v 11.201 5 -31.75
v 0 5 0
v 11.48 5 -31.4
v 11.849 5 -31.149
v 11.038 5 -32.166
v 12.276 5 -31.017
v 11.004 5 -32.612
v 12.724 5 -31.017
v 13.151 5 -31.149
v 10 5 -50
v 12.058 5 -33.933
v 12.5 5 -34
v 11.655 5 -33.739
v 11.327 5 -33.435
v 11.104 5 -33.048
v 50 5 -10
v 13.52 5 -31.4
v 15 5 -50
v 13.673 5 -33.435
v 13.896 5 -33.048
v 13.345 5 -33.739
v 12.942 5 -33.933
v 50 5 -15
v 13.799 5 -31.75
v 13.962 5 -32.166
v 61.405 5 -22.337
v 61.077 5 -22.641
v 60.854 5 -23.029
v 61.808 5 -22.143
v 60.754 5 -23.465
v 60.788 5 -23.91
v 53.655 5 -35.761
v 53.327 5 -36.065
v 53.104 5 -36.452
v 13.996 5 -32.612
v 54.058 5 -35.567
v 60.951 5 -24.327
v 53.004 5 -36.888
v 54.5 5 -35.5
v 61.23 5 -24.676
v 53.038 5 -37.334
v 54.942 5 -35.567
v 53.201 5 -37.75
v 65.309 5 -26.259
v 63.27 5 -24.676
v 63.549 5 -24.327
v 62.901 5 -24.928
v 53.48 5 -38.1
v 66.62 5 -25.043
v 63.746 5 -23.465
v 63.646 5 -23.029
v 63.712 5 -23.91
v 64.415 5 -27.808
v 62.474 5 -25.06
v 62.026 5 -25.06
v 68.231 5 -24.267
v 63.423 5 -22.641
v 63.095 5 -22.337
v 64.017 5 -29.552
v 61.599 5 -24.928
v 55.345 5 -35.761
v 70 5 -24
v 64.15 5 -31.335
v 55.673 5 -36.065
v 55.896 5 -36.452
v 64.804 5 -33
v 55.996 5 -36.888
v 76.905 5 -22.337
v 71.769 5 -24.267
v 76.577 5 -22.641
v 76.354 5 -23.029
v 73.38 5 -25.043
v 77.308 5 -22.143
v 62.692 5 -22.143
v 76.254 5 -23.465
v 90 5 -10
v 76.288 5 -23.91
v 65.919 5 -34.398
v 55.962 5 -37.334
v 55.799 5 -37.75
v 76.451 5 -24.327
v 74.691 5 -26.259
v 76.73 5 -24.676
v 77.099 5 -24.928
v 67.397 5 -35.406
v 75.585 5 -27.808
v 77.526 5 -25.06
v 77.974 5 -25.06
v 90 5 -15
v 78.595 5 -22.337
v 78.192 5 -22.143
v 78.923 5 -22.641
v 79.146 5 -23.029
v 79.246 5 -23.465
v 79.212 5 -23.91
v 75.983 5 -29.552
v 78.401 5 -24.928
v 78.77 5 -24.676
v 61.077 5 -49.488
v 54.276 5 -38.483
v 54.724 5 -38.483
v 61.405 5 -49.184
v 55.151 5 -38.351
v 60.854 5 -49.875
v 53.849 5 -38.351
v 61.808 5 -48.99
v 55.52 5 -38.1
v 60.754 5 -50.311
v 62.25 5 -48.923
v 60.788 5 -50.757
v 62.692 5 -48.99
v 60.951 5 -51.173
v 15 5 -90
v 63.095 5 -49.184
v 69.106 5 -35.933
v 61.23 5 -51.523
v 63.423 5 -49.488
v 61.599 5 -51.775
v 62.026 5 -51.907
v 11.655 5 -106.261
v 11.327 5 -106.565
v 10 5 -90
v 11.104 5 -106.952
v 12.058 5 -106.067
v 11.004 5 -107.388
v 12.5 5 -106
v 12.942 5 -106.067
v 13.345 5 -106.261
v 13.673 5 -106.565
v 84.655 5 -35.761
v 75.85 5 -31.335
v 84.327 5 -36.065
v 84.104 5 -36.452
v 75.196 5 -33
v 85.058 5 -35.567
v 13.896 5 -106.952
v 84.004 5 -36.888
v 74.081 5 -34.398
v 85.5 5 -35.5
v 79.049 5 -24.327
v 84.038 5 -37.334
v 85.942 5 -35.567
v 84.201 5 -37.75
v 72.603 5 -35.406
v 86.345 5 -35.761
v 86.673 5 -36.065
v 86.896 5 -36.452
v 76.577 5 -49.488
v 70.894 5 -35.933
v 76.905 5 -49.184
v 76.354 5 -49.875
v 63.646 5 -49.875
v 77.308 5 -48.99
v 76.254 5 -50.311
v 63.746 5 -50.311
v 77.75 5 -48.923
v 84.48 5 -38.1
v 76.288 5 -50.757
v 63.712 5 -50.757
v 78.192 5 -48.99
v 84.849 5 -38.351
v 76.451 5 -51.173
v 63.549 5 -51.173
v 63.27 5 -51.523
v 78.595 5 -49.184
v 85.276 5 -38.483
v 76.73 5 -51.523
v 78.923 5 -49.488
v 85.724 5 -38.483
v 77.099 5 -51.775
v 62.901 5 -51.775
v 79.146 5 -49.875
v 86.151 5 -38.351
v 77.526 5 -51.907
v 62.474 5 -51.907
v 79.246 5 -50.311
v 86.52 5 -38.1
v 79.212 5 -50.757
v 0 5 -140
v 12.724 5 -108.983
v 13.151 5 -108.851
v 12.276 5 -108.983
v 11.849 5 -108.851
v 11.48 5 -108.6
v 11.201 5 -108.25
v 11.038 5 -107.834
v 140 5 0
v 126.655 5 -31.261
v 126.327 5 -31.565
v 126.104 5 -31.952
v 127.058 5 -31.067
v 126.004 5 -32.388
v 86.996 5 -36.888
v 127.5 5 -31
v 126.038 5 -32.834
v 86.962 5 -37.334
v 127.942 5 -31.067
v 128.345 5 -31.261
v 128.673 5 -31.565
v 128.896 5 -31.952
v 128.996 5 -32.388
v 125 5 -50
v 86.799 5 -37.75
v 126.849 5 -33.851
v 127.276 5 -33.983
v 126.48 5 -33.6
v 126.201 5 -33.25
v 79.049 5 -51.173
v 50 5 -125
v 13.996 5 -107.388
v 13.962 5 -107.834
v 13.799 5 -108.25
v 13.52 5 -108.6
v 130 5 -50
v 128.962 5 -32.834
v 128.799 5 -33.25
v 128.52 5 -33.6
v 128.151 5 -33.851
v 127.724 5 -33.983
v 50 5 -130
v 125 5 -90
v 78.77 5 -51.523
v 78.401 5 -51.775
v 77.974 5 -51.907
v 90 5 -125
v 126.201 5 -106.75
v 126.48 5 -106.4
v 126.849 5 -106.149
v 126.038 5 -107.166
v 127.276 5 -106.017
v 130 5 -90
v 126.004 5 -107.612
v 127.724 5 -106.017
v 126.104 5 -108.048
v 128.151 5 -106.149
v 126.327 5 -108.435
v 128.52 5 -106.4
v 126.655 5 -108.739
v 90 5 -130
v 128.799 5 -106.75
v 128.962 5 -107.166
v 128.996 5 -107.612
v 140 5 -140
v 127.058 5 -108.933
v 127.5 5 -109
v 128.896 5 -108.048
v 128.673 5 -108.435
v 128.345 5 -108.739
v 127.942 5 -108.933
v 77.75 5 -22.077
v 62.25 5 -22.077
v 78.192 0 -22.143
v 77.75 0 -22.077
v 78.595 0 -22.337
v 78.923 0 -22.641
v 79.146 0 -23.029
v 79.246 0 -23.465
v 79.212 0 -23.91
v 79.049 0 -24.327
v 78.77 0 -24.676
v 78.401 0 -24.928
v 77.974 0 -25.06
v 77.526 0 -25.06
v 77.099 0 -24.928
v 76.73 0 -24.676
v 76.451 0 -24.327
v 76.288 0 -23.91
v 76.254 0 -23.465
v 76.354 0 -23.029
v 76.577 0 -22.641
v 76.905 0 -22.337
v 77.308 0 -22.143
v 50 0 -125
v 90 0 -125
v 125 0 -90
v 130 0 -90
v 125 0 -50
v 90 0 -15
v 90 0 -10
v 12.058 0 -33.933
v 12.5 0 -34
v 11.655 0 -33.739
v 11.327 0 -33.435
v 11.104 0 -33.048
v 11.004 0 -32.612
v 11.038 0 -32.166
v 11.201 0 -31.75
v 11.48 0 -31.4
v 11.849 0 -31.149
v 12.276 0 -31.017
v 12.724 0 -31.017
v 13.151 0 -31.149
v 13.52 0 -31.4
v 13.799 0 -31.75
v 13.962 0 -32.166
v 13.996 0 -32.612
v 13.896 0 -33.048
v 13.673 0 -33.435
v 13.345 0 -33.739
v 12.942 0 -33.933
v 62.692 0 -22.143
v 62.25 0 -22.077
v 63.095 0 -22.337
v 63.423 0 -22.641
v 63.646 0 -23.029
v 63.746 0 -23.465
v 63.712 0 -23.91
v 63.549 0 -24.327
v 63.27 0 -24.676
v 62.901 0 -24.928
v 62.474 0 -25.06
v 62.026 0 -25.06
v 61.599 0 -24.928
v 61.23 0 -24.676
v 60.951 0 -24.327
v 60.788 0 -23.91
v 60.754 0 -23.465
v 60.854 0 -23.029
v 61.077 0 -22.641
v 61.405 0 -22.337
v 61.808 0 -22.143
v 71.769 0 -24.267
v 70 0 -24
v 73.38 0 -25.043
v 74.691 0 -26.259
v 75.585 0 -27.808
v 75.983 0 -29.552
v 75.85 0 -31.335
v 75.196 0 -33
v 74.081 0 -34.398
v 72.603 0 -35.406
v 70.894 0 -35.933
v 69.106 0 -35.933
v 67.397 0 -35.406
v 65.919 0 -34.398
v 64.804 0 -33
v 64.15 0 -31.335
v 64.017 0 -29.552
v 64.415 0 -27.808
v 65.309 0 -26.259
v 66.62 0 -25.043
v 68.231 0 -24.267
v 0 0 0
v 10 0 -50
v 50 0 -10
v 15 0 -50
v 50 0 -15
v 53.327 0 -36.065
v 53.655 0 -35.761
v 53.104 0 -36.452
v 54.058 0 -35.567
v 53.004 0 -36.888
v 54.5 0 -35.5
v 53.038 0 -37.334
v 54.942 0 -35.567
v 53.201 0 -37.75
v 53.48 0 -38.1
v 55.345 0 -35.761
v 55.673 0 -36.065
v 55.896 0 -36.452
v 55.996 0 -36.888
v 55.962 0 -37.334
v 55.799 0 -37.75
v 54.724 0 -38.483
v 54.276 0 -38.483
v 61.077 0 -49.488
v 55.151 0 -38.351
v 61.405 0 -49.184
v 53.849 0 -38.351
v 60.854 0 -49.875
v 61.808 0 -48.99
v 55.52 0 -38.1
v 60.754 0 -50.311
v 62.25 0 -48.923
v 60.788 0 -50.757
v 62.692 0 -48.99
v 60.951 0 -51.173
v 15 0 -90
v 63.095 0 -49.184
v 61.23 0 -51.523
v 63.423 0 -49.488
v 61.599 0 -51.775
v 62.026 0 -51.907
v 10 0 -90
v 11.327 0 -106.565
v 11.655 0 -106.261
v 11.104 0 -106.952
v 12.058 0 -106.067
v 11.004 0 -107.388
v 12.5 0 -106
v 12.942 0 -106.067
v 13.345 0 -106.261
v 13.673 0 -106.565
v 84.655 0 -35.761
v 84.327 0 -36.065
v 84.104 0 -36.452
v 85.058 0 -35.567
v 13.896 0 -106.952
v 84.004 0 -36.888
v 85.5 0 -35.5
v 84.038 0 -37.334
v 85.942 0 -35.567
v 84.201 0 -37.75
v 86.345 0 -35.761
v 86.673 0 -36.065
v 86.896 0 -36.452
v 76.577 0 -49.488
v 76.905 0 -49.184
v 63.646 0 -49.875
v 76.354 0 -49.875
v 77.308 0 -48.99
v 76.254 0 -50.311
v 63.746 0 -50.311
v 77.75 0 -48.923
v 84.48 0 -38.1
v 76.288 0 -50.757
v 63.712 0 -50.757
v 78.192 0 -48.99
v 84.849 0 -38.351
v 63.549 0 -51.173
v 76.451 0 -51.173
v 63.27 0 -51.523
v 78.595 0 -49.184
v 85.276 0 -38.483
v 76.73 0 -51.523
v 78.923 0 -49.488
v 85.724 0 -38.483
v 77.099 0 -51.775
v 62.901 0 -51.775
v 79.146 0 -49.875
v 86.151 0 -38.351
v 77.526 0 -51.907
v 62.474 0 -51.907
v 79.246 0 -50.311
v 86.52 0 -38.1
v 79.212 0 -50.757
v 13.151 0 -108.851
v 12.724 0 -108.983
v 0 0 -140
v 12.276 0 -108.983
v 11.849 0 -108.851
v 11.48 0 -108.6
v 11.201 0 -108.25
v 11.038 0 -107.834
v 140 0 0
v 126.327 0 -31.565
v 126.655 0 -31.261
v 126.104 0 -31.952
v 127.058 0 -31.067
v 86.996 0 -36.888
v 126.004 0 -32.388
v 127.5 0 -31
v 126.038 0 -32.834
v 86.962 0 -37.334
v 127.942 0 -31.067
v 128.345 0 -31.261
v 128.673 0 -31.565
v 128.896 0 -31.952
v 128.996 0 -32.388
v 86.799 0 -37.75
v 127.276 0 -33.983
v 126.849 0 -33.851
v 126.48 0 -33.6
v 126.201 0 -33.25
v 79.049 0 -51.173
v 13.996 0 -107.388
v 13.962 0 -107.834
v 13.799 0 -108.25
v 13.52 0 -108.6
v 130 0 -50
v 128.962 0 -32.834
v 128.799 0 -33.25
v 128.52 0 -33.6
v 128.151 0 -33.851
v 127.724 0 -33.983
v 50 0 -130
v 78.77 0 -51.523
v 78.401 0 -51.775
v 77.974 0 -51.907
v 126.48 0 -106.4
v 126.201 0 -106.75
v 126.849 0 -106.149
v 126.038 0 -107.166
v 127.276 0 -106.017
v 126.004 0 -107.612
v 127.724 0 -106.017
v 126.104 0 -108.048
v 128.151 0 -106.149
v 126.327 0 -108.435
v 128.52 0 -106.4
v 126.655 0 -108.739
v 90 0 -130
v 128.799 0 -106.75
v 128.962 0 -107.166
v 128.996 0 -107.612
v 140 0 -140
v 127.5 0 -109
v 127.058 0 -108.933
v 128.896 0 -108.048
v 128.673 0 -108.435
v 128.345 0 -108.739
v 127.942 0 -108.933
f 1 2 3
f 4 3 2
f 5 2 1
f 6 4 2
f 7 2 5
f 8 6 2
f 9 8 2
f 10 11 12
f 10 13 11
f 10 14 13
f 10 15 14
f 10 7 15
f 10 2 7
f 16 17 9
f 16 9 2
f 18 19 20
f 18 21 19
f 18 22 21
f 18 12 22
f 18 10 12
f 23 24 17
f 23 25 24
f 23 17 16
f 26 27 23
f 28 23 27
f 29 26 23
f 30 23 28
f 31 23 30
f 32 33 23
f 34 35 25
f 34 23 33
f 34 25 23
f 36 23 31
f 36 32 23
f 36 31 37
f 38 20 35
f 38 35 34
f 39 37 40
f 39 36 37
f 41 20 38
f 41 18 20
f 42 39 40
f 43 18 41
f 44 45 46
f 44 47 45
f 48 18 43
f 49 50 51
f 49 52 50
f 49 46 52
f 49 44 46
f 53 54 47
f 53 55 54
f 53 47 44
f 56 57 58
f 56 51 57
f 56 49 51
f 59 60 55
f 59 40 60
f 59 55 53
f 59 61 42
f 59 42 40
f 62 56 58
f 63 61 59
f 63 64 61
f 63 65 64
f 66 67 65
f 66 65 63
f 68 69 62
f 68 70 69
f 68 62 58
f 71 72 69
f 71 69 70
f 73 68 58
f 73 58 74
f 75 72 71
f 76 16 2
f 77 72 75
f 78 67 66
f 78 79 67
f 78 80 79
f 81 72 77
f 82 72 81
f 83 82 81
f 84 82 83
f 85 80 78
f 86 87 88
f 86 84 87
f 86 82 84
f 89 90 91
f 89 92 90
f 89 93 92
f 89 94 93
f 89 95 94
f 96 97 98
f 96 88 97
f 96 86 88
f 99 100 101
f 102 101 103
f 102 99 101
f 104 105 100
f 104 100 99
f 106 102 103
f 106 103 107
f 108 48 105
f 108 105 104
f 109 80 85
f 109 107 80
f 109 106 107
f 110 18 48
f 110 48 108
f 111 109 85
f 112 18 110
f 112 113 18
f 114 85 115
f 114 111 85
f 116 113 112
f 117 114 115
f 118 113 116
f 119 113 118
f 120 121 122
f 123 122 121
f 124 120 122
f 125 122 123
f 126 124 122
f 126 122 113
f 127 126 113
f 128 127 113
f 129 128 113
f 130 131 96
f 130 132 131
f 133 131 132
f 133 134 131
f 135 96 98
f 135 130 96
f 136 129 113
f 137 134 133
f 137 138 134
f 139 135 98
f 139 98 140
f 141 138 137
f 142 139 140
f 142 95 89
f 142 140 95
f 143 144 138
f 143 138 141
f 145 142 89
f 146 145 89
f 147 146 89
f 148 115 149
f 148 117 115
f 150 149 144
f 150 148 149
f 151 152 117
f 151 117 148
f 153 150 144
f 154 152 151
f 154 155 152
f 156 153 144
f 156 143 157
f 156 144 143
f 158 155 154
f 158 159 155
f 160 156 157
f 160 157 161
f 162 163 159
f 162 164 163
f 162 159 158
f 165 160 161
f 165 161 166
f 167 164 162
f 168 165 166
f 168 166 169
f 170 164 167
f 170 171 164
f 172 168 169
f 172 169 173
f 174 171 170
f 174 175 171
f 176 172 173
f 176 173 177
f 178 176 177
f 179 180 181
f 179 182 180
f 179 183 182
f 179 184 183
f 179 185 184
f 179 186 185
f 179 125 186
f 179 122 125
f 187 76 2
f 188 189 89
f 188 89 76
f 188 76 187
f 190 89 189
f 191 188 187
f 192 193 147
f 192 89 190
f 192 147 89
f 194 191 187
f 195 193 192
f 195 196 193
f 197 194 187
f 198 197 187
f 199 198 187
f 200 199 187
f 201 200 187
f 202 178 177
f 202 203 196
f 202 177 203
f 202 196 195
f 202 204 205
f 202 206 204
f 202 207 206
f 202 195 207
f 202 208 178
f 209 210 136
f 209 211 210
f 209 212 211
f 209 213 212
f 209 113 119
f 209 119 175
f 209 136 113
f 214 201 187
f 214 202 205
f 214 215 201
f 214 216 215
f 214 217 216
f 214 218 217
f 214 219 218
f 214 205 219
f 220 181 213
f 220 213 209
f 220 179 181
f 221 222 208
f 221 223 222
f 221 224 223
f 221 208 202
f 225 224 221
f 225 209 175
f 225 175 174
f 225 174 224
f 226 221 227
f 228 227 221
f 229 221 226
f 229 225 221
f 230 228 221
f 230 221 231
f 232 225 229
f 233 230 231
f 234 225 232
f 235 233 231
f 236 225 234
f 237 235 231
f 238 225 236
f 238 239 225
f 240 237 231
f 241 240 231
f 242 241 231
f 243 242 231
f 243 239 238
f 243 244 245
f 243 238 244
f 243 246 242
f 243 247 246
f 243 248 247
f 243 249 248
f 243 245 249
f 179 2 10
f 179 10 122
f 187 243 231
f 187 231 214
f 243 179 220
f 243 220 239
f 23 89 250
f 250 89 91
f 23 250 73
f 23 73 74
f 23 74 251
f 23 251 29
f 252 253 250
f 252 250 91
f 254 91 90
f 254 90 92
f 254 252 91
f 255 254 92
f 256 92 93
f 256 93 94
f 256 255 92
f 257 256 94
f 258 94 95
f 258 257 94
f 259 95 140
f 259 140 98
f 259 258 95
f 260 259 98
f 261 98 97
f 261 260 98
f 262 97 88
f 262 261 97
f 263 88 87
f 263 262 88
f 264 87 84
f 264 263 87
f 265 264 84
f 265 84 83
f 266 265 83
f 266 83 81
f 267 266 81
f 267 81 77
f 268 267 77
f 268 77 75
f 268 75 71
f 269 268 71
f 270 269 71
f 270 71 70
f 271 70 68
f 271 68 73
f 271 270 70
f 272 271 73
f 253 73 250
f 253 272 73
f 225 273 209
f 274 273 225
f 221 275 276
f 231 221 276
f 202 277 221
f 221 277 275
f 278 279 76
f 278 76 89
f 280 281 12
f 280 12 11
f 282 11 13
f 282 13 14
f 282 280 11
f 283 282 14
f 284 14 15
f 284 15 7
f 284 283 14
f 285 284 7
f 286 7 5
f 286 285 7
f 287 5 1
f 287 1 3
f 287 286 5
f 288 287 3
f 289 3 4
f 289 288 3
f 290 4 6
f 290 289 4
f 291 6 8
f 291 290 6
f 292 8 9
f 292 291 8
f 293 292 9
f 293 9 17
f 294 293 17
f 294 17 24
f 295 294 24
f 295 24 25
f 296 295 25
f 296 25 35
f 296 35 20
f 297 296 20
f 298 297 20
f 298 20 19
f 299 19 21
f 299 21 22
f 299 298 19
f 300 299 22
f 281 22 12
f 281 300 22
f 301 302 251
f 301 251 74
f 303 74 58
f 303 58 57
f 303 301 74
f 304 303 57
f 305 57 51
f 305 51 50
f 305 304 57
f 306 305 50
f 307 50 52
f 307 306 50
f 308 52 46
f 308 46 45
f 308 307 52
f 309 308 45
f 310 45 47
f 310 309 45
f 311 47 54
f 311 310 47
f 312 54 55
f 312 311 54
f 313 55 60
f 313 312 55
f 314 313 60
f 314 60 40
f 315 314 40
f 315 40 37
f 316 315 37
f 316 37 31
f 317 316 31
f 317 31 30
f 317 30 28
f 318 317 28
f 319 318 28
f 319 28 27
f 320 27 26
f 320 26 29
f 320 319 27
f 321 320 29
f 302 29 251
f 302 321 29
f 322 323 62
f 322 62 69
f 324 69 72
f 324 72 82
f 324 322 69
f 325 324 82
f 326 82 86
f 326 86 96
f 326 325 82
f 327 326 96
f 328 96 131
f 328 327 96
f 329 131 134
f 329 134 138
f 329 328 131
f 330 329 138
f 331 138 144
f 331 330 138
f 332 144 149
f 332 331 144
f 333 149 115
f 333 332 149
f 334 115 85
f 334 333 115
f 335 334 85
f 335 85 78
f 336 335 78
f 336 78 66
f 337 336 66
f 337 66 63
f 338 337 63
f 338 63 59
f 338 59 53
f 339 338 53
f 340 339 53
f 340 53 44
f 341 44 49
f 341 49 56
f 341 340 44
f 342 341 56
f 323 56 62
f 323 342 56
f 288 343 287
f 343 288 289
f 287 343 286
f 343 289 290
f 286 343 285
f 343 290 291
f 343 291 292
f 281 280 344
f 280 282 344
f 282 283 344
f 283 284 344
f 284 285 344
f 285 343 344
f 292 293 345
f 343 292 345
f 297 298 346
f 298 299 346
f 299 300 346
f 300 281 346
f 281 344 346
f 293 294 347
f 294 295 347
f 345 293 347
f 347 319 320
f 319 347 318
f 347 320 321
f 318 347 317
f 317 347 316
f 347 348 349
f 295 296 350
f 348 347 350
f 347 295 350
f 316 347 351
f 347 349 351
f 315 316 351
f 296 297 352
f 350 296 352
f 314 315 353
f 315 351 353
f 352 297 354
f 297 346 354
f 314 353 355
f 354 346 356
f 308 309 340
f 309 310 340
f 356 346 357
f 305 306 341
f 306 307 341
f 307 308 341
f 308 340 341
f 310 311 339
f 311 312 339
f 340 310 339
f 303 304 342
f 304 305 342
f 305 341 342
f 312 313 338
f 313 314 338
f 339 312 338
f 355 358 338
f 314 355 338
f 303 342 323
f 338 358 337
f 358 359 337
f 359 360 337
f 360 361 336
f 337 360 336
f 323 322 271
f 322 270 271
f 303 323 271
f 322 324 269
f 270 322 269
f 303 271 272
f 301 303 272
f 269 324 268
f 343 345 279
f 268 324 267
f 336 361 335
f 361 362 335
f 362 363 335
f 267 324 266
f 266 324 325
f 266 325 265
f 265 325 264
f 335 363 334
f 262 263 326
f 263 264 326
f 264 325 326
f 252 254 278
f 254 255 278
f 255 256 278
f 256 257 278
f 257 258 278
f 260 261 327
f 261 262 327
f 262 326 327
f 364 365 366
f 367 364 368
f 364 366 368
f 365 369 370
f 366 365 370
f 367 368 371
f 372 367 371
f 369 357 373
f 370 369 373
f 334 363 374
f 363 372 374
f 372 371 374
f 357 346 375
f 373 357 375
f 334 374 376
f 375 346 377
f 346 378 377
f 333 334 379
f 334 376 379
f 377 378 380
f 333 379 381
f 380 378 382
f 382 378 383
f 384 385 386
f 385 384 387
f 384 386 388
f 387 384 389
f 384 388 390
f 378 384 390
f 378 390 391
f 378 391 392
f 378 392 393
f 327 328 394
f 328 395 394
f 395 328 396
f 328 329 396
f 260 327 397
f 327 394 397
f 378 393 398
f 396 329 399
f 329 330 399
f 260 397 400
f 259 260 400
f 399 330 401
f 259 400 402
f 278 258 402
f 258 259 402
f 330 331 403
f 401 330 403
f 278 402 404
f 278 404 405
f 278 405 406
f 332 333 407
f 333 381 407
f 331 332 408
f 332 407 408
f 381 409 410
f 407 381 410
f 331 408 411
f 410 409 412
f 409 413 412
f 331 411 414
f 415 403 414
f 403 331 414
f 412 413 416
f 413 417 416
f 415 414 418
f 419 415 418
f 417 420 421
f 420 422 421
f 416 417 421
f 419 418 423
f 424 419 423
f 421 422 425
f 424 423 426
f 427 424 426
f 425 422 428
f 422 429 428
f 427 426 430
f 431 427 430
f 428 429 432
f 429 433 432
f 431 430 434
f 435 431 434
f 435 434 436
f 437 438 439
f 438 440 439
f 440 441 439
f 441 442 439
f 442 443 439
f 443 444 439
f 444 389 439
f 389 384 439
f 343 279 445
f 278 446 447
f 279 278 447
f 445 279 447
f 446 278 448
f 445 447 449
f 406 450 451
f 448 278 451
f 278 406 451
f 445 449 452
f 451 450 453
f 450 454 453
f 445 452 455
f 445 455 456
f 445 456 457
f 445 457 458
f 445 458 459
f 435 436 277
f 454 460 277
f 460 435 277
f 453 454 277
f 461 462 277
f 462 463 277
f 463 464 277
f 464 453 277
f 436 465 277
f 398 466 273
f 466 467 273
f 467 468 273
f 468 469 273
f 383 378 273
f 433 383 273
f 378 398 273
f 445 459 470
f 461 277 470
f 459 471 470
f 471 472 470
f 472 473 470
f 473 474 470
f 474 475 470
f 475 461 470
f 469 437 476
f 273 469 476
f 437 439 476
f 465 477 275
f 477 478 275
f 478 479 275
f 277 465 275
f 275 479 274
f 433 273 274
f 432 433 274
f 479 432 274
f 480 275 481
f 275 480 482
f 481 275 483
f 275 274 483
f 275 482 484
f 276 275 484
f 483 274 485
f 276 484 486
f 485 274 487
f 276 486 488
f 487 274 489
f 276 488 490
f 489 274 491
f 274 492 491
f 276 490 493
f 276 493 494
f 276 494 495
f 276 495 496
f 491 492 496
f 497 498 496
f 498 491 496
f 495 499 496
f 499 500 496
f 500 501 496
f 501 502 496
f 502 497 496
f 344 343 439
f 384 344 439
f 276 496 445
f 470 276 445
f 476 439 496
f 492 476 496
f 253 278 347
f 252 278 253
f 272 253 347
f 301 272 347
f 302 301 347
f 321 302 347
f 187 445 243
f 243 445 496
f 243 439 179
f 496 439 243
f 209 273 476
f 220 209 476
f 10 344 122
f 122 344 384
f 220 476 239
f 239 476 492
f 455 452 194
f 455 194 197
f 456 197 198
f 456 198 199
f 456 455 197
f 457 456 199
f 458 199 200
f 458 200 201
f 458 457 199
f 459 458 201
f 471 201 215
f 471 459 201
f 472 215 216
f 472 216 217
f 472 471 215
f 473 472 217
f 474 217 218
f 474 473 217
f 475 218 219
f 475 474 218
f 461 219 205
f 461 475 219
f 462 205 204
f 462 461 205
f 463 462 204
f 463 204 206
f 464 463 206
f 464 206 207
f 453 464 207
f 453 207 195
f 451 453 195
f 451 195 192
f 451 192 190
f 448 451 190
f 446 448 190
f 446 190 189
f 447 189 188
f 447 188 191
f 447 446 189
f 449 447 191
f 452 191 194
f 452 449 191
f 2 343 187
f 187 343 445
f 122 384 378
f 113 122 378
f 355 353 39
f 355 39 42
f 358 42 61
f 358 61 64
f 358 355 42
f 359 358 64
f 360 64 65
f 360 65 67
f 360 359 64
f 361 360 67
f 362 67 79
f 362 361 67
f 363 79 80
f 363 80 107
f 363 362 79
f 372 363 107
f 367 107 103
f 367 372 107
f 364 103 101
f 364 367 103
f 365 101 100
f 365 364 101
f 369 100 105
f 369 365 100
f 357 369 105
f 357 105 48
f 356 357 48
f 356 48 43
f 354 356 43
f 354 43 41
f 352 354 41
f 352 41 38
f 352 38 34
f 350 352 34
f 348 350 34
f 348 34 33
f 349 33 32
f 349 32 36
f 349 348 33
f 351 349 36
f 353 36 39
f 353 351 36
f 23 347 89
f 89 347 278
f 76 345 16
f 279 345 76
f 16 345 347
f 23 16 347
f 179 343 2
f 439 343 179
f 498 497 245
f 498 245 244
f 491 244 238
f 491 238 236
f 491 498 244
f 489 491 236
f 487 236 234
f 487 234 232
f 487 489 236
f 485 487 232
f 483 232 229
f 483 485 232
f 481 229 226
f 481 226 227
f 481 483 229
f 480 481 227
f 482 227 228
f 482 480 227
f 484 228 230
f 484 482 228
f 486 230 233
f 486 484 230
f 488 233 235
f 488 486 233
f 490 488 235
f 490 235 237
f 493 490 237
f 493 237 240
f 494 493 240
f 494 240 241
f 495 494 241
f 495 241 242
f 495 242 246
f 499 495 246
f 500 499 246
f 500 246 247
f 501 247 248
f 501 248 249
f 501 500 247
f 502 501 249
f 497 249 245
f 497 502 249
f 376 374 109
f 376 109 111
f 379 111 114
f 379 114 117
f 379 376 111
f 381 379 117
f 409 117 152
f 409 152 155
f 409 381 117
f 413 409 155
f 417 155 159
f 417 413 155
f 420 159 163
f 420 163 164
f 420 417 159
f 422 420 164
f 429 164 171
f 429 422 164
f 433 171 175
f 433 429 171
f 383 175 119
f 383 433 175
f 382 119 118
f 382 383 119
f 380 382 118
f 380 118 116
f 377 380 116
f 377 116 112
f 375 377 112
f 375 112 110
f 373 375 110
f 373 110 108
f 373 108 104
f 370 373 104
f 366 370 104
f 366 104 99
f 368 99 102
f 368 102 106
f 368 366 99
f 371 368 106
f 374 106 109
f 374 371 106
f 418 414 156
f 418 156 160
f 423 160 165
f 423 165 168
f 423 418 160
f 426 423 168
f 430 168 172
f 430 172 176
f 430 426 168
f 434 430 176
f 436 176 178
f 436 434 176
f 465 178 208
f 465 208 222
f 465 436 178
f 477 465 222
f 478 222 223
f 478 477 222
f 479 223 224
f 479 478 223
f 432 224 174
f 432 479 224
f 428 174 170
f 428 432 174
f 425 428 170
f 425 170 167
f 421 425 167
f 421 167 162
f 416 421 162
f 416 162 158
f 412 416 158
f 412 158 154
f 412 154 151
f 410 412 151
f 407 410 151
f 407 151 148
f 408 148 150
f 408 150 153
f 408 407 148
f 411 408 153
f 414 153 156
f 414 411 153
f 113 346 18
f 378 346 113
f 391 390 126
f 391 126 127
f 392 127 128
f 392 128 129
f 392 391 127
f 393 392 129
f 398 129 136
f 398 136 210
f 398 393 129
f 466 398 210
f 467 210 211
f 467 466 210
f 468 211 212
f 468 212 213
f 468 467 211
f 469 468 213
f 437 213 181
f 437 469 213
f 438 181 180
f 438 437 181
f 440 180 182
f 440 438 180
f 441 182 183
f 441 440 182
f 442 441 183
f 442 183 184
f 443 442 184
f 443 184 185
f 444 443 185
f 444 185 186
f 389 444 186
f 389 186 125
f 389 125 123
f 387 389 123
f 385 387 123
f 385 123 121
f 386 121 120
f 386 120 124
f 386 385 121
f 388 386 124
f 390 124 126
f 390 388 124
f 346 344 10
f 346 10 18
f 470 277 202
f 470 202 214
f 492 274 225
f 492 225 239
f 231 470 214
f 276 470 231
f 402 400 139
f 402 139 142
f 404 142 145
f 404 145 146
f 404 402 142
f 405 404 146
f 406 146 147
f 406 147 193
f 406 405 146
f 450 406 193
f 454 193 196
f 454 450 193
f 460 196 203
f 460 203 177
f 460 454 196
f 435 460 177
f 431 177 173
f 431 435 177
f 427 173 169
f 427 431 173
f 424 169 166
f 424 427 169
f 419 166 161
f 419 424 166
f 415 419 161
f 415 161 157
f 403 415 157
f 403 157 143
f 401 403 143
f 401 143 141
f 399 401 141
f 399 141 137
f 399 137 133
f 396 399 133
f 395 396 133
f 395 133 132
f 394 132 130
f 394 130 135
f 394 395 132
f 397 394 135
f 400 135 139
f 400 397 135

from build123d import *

# Parameters (mm, degrees)
CROQUIS2_W              = 140
CROQUIS2_H              = 140
CROQUIS2_R              = 1.5
CROQUIS2_R_2            = 6
CROQUIS2_W_2            = 40
CROQUIS2_H_2            = 5
CROQUIS2_W_3            = 5
CROQUIS2_H_3            = 40
SALIENTE_EXTRUIR1_DEPTH = 5


with BuildPart() as part:
    # Croquis2 → Saliente-Extruir1 (new body)
    with BuildSketch(Plane(origin=(0, 0, 0), x_dir=(1, 0, 0), z_dir=(0, 1, 0))):
        with Locations((70, 70)):
            Rectangle(CROQUIS2_W, CROQUIS2_H)
        with Locations(Location((12.5, 107.5, 0), (0, 0, 270))):
            Circle(CROQUIS2_R, mode=Mode.SUBTRACT)
        with Locations(Location((12.5, 32.5, 0), (0, 0, 90))):
            Circle(CROQUIS2_R, mode=Mode.SUBTRACT)
        with Locations(Location((127.5, 32.5, 0), (0, 0, 270))):
            Circle(CROQUIS2_R, mode=Mode.SUBTRACT)
        with Locations(Location((127.5, 107.5, 0), (0, 0, 90))):
            Circle(CROQUIS2_R, mode=Mode.SUBTRACT)
        with Locations(Location((85.5, 37, 0), (0, 0, 270))):
            Circle(CROQUIS2_R, mode=Mode.SUBTRACT)
        with Locations(Location((77.75, 23.576606241, 0), (0, 0, 270))):
            Circle(CROQUIS2_R, mode=Mode.SUBTRACT)
        with Locations(Location((62.25, 23.576606241, 0), (0, 0, 270))):
            Circle(CROQUIS2_R, mode=Mode.SUBTRACT)
        with Locations(Location((54.5, 37, 0), (0, 0, 270))):
            Circle(CROQUIS2_R, mode=Mode.SUBTRACT)
        with Locations(Location((62.25, 50.423393759, 0), (0, 0, 270))):
            Circle(CROQUIS2_R, mode=Mode.SUBTRACT)
        with Locations(Location((77.75, 50.423393759, 0), (0, 0, 270))):
            Circle(CROQUIS2_R, mode=Mode.SUBTRACT)
        with Locations(Location((70, 30, 0), (0, 0, 270))):
            Circle(CROQUIS2_R_2, mode=Mode.SUBTRACT)
        with Locations((70, 127.5)):
            Rectangle(CROQUIS2_W_2, CROQUIS2_H_2, mode=Mode.SUBTRACT)
        with Locations((70, 12.5)):
            Rectangle(CROQUIS2_W_2, CROQUIS2_H_2, mode=Mode.SUBTRACT)
        with Locations((127.5, 70)):
            Rectangle(CROQUIS2_W_3, CROQUIS2_H_3, mode=Mode.SUBTRACT)
        with Locations((12.5, 70)):
            Rectangle(CROQUIS2_W_3, CROQUIS2_H_3, mode=Mode.SUBTRACT)
    extrude(amount=SALIENTE_EXTRUIR1_DEPTH)


solid = part.part
